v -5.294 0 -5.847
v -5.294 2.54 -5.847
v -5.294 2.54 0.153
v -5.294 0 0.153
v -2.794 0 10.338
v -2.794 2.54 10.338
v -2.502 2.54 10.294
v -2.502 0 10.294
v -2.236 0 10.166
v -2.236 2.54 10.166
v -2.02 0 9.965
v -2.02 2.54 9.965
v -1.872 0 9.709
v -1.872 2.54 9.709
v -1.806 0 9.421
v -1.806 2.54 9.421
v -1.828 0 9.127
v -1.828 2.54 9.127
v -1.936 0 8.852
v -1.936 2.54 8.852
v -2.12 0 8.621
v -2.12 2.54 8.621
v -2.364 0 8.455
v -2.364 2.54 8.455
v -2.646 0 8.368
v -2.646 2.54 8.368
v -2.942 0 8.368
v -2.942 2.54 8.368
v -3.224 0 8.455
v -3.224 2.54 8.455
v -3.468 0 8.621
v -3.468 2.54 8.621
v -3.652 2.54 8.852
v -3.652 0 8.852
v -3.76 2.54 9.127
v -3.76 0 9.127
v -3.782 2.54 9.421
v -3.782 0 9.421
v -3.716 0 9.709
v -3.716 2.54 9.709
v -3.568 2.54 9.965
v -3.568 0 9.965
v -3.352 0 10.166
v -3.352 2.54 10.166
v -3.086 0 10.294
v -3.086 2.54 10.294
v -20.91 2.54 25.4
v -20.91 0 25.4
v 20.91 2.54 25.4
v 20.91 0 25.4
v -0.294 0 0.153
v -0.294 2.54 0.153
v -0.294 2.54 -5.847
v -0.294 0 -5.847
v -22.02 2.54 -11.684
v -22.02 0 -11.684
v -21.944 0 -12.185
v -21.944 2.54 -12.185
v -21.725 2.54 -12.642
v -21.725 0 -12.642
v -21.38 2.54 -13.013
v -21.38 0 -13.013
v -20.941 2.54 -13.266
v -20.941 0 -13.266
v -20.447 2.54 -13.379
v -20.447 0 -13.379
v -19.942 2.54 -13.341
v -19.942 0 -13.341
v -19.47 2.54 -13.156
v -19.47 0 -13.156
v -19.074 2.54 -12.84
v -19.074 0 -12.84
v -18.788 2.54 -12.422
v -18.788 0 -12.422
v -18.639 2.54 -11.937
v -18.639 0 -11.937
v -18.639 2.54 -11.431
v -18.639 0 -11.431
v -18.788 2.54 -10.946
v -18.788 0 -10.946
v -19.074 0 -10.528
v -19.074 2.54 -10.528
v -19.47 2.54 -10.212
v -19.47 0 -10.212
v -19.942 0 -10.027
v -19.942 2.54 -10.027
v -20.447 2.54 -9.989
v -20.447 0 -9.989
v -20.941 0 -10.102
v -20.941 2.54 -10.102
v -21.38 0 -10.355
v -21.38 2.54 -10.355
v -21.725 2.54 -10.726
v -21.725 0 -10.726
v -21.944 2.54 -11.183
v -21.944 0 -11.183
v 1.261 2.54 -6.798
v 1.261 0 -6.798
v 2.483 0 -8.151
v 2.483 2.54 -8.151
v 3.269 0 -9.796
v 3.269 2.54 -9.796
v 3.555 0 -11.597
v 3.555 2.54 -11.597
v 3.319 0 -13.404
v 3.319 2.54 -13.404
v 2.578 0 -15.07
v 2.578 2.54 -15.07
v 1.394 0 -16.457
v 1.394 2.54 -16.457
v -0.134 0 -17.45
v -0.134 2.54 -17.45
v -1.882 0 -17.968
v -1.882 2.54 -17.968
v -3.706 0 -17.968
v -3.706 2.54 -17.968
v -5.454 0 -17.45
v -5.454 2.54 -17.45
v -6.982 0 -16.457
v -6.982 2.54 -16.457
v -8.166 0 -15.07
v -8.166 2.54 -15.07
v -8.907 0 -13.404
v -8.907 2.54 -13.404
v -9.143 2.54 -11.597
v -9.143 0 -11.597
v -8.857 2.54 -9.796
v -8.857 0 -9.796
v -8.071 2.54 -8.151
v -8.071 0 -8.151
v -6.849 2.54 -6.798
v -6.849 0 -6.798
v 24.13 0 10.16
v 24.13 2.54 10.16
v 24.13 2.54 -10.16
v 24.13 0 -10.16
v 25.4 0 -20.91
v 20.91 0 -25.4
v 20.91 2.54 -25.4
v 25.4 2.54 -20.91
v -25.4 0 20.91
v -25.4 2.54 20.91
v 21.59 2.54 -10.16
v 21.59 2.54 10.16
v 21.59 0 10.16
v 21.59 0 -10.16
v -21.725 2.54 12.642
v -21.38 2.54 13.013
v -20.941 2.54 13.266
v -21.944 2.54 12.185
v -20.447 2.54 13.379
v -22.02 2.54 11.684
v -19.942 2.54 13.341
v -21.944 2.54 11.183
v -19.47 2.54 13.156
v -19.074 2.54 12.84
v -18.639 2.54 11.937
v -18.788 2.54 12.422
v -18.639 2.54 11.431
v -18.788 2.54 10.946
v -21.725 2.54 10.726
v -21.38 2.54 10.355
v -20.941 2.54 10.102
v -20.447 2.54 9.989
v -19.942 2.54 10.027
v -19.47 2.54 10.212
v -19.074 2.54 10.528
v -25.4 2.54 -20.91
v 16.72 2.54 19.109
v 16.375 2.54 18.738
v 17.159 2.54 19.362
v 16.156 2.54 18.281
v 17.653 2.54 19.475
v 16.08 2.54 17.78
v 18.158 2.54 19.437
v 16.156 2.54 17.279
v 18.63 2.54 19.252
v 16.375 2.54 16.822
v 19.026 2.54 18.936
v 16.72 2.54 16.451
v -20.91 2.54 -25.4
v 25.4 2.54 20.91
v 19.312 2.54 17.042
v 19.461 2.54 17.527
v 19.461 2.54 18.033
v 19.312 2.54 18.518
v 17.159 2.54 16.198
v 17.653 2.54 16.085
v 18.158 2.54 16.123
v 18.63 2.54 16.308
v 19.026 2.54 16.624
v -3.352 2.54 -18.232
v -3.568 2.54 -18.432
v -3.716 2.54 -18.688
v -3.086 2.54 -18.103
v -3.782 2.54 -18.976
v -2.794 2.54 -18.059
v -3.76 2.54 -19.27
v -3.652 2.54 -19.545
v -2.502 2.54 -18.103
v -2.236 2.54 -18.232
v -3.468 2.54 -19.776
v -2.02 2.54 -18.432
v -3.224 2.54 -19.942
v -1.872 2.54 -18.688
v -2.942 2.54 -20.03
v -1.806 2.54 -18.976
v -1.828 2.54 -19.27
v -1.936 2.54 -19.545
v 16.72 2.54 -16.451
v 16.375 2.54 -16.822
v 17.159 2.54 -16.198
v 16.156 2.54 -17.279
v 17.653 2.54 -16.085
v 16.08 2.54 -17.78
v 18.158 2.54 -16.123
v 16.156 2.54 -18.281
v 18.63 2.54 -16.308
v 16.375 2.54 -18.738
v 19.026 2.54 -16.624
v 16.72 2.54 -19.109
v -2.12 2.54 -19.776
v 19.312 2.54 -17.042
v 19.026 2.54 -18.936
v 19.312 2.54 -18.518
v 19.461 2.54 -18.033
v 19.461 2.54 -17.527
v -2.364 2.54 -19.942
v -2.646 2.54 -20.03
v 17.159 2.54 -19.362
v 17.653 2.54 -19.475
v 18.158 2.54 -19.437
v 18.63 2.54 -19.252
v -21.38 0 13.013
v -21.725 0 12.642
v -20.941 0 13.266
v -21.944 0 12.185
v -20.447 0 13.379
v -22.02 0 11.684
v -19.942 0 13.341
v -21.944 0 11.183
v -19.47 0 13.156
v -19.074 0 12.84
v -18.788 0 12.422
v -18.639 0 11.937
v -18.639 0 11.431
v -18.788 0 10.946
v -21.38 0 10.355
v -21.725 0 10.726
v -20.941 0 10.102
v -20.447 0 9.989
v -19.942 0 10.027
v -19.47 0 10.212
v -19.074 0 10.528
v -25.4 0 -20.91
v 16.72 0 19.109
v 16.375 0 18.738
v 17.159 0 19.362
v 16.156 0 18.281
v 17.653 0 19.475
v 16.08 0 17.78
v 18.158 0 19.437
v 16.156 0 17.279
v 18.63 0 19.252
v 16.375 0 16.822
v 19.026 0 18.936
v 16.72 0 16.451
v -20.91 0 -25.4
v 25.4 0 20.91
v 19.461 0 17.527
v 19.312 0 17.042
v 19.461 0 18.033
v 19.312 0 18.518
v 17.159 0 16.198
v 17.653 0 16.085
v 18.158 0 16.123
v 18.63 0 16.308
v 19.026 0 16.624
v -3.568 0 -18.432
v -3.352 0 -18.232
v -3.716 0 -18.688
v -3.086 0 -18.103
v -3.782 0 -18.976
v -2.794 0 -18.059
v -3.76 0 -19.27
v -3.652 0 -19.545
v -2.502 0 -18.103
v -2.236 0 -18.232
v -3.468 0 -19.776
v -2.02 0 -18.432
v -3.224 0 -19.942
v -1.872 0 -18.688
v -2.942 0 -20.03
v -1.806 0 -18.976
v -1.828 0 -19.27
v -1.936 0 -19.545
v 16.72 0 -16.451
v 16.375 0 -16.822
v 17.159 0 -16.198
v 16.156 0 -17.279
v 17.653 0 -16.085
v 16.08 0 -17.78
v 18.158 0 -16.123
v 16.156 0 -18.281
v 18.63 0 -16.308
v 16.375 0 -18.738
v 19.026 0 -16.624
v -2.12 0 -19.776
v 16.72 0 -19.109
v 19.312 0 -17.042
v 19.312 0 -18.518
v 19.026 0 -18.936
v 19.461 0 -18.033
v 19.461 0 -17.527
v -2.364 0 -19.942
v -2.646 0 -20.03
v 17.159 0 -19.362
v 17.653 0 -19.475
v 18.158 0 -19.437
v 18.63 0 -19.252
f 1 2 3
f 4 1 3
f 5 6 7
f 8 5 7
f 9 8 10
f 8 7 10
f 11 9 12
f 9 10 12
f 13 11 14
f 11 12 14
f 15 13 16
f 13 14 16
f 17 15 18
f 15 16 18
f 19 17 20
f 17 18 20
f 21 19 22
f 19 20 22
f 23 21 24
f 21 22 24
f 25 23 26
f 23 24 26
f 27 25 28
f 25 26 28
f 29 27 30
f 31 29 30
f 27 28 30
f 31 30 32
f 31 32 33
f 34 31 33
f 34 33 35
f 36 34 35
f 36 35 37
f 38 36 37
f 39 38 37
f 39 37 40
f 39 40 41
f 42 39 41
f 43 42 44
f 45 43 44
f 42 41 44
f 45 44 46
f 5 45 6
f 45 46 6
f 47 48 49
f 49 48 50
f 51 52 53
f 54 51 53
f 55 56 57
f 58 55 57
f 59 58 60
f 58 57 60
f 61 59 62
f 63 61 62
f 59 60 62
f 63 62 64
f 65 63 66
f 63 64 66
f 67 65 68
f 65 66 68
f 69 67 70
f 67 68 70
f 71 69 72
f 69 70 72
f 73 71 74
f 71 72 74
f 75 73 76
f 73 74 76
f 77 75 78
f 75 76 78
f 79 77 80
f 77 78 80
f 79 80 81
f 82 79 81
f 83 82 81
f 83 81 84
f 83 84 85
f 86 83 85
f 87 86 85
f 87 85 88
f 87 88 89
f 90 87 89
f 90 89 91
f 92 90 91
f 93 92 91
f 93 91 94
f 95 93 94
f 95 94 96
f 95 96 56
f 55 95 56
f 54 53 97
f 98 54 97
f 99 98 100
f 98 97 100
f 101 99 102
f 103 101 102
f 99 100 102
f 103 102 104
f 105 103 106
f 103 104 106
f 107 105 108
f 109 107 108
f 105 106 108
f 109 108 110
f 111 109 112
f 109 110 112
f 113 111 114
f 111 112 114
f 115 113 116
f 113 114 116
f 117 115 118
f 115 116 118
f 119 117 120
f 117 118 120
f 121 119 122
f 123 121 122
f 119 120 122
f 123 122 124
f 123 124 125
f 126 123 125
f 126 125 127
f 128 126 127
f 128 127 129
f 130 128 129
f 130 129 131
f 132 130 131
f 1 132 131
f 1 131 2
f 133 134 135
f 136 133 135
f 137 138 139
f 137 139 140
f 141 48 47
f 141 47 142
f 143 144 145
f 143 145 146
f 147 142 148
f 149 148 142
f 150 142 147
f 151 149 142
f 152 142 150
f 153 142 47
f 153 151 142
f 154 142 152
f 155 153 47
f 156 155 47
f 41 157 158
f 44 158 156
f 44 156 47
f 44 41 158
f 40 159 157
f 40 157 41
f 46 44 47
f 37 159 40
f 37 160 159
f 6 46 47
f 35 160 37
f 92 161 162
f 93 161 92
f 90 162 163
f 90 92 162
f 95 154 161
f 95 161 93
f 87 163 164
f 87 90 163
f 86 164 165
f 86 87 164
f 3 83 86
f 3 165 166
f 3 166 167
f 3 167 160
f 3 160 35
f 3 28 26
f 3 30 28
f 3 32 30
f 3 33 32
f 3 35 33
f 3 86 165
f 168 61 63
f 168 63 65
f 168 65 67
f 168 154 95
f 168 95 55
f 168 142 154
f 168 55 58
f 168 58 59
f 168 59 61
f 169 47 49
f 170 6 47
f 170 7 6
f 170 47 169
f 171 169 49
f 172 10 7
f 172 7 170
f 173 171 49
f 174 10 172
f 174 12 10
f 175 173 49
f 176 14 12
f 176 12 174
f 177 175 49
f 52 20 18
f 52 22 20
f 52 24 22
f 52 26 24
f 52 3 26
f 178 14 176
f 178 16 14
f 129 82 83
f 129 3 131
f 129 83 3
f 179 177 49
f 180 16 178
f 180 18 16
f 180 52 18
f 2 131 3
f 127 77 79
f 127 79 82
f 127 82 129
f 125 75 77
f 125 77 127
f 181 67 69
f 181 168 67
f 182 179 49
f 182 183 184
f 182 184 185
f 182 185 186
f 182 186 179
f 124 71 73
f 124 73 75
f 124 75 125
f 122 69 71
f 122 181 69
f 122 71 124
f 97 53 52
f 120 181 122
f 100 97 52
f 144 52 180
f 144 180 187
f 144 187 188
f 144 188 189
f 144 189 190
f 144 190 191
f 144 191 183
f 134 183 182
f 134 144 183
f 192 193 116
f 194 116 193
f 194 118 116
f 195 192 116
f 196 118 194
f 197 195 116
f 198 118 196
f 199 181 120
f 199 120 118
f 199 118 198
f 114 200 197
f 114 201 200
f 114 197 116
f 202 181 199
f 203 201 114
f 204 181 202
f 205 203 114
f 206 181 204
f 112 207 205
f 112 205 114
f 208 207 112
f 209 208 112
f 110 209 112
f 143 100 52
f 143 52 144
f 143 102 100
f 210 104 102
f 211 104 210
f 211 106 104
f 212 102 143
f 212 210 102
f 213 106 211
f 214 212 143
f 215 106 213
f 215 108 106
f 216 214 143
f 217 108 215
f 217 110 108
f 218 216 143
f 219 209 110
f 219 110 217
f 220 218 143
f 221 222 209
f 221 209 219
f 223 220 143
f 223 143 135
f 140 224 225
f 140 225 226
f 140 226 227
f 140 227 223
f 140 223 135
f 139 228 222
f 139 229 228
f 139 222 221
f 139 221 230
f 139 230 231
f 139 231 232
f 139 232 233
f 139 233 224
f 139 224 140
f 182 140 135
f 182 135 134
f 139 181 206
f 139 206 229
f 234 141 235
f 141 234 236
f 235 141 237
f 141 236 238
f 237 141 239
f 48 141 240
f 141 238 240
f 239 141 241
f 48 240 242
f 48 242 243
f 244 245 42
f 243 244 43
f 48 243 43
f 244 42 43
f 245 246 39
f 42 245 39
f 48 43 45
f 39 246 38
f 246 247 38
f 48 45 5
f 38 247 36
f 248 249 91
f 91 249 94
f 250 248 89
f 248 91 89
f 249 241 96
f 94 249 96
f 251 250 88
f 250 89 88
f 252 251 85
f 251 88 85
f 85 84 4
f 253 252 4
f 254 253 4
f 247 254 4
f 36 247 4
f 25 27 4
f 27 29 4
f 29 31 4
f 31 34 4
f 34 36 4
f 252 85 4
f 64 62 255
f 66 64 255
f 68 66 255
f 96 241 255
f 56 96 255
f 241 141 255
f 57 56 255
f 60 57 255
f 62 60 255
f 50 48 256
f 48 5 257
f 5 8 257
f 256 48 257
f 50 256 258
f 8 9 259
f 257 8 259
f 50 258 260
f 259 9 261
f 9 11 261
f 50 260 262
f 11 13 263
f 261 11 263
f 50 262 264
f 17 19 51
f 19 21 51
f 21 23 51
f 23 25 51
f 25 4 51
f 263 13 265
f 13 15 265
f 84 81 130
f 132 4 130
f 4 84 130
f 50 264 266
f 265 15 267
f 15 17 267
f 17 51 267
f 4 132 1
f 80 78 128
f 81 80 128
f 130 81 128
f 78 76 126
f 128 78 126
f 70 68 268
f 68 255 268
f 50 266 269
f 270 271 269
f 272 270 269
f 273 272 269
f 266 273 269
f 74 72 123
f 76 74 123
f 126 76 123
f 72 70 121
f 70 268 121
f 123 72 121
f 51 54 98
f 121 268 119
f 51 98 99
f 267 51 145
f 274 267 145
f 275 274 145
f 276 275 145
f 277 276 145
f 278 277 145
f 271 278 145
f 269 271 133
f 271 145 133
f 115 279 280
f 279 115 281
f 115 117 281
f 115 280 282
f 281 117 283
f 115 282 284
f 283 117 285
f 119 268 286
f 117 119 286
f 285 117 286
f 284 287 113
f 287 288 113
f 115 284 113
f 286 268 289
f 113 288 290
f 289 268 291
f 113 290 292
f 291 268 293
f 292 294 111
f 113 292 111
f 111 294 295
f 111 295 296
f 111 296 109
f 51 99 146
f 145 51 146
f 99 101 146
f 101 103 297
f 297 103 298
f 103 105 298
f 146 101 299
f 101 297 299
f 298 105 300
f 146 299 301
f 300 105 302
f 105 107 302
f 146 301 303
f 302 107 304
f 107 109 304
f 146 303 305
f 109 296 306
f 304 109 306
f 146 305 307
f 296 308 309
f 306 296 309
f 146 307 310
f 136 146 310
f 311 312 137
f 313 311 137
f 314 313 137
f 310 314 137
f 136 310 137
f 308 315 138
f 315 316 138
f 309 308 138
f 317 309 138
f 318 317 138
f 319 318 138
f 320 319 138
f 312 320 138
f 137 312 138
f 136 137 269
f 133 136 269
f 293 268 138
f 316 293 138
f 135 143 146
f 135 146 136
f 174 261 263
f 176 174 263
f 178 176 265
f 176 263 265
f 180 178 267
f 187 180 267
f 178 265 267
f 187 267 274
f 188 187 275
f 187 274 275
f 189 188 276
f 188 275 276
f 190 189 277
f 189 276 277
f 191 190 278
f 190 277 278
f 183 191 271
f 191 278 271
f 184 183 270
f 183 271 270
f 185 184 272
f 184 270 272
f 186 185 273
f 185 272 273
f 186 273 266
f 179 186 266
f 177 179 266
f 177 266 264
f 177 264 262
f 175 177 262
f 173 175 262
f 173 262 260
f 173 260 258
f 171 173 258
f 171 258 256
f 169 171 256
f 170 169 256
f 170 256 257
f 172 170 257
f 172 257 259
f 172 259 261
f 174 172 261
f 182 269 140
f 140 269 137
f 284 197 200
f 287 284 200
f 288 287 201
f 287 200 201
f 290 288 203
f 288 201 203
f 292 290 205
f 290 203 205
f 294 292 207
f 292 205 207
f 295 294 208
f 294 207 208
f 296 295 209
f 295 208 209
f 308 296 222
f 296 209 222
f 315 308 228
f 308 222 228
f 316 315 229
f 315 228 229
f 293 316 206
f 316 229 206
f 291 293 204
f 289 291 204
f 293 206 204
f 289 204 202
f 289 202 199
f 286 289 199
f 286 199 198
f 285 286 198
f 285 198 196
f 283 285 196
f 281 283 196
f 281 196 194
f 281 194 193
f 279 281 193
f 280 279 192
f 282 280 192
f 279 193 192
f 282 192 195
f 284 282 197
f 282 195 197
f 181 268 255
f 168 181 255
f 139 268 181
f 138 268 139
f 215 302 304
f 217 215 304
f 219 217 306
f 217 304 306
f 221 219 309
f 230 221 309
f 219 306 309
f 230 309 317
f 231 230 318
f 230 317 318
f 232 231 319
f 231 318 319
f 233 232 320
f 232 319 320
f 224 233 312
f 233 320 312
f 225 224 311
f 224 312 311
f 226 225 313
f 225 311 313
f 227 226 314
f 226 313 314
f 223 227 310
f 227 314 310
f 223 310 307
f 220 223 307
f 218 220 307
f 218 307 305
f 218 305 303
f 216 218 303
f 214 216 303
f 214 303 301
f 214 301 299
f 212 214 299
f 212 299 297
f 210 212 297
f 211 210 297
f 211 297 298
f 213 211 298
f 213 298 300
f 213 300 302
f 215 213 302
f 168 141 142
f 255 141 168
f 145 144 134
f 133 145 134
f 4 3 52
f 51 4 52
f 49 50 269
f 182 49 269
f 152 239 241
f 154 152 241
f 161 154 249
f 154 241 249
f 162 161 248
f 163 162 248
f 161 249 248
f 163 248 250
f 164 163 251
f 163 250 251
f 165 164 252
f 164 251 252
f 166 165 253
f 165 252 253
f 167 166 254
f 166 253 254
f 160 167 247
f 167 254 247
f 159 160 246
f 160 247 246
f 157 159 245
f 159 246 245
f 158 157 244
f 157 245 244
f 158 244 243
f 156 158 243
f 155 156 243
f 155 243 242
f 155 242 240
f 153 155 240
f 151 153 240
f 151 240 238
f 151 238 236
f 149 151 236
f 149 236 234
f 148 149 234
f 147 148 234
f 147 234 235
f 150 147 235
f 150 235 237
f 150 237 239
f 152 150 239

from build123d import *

# Parameters (mm, degrees)
SKETCH1_W                       = 50.8
SKETCH1_H                       = 50.8
BOSS_EXTRUDE1_DEPTH             = 2.54
HOLES_FOR_ARMS_D                = 3.4
HOLES_FOR_STRUCTURE_D           = 3.4
CORNERS_START                   = -2.54
CORNERS_DEPTH                   = 39.550715072
MIRROR_START                    = -2.54
MIRROR_OF_CORNER_2_COPY_1_DEPTH = 39.550715072
SKETCH16_W                      = 2.54
SKETCH16_H                      = 2.54
CUT_EXTRUDE1_DEPTH              = 2.54
SKETCH17_R                      = 1.905
BOSS_EXTRUDE4_DEPTH             = 2.54
SKETCH17_6_R                    = 1.905
CUT_EXTRUDE2_DEPTH              = 37.010715072
SKETCH18_R                      = 0.9906
CUT_EXTRUDE3_DEPTH              = 2.54
SKETCH19_W                      = 2.54
SKETCH19_H                      = 15.24
CUT_EXTRUDE4_DEPTH              = 37.010715072


with BuildPart() as part:
    # Sketch1 → Boss-Extrude1 (new body)
    with BuildSketch(Plane(origin=(0, 0, 0), x_dir=(1, 0, 0), z_dir=(0, 1, 0))):
        Rectangle(SKETCH1_W, SKETCH1_H)
    extrude(amount=BOSS_EXTRUDE1_DEPTH)

    # holes for arms (through all)
    with Locations(Plane(origin=(0, 2.54, 0), x_dir=(1, 0, 0), z_dir=(0, 1, 0))):
        with Locations((-20.32, -11.684), (-20.32, 11.684)):
            Hole(HOLES_FOR_ARMS_D / 2)

    # holes for structure (through all)
    with Locations(Plane(origin=(0, 2.54, 0), x_dir=(1, 0, 0), z_dir=(0, 1, 0))):
        with Locations((17.78, -17.78), (17.78, 17.78)):
            Hole(HOLES_FOR_STRUCTURE_D / 2)

    # Sketch12 → corners (cut)
    with BuildSketch(Plane(origin=(0, 2.54, 0), x_dir=(1, 0, 0), z_dir=(0, 1, 0)).offset(CORNERS_START)):
        Polygon((-25.4, -25.4), (-20.909871939, -25.4), (-25.4, -20.909871939), align=None)
    corners = extrude(amount=CORNERS_DEPTH, mode=Mode.SUBTRACT)

    # mirror of corner: corners across plane
    add(corners.mirror(Plane.ZY), mode=Mode.SUBTRACT)

    # mirror of corner 2: corners across plane
    add(corners.mirror(Plane(origin=(0, 0, 0), x_dir=(1, 0, 0), z_dir=(0, 0, -1))), mode=Mode.SUBTRACT)

    # mirror of corner 2 copy 1 sketch → mirror of corner 2 copy 1 (cut)
    with BuildSketch(Plane(origin=(0, 2.54, 0), x_dir=(-1, 0, 0), z_dir=(0, 1, 0)).offset(MIRROR_START)):
        Polygon((-25.4, -25.4), (-20.909871939, -25.4), (-25.4, -20.909871939), align=None)
    extrude(amount=MIRROR_OF_CORNER_2_COPY_1_DEPTH, mode=Mode.SUBTRACT)

    # Sketch16 → Cut-Extrude1 (cut)
    with BuildSketch(Plane(origin=(0, 2.54, 0), x_dir=(1, 0, 0), z_dir=(0, 1, 0))):
        with Locations((22.86, -8.89)):
            Rectangle(SKETCH16_W, SKETCH16_H)
        with Locations((22.86, 8.89)):
            Rectangle(SKETCH16_W, SKETCH16_H)
    extrude(amount=-CUT_EXTRUDE1_DEPTH, mode=Mode.SUBTRACT)

    # Sketch17 → Boss-Extrude4 (add, through all)
    with BuildSketch(Plane(origin=(0, 2.54, 0), x_dir=(1, 0, 0), z_dir=(0, 1, 0))):
        with Locations((-2.794, 11.684)):
            Circle(SKETCH17_R)
    extrude(amount=-BOSS_EXTRUDE4_DEPTH)

    # Sketch17<6> → Cut-Extrude2 (cut, through all)
    with BuildSketch(Plane(origin=(0, 2.54, 0), x_dir=(1, 0, 0), z_dir=(0, 1, 0))):
        with Locations(Location((-2.794, 11.684, 0), (0, 0, 270))):
            Circle(SKETCH17_6_R)
    extrude(amount=-CUT_EXTRUDE2_DEPTH, mode=Mode.SUBTRACT)

    # Sketch18 → Cut-Extrude3 (cut)
    with BuildSketch(Plane(origin=(0, 2.54, 0), x_dir=(1, 0, 0), z_dir=(0, 1, 0))):
        with Locations(Location((-2.794, 19.05, 0), (0, 0, 270))):
            Circle(SKETCH18_R)
        with Locations(Location((-2.794, -9.3472, 0), (0, 0, 270))):
            Circle(SKETCH18_R)
        with BuildLine():
            Line((-5.294, 5.846834592), (-5.294, -0.153165408))
            Line((-5.294, -0.153165408), (-0.294, -0.153165408))
            Line((-0.294, -0.153165408), (-0.294, 5.846834592))
            ThreePointArc((-0.294, 5.846834592), (-2.794, 18.034), (-5.294, 5.846834592))
        make_face()
    extrude(amount=-CUT_EXTRUDE3_DEPTH, mode=Mode.SUBTRACT)

    # Sketch19 → Cut-Extrude4 (cut, through all)
    with BuildSketch(Plane(origin=(0, 2.54, 0), x_dir=(1, 0, 0), z_dir=(0, 1, 0))):
        with Locations((22.86, 0)):
            Rectangle(SKETCH19_W, SKETCH19_H)
    extrude(amount=-CUT_EXTRUDE4_DEPTH, mode=Mode.SUBTRACT)


solid = part.part
